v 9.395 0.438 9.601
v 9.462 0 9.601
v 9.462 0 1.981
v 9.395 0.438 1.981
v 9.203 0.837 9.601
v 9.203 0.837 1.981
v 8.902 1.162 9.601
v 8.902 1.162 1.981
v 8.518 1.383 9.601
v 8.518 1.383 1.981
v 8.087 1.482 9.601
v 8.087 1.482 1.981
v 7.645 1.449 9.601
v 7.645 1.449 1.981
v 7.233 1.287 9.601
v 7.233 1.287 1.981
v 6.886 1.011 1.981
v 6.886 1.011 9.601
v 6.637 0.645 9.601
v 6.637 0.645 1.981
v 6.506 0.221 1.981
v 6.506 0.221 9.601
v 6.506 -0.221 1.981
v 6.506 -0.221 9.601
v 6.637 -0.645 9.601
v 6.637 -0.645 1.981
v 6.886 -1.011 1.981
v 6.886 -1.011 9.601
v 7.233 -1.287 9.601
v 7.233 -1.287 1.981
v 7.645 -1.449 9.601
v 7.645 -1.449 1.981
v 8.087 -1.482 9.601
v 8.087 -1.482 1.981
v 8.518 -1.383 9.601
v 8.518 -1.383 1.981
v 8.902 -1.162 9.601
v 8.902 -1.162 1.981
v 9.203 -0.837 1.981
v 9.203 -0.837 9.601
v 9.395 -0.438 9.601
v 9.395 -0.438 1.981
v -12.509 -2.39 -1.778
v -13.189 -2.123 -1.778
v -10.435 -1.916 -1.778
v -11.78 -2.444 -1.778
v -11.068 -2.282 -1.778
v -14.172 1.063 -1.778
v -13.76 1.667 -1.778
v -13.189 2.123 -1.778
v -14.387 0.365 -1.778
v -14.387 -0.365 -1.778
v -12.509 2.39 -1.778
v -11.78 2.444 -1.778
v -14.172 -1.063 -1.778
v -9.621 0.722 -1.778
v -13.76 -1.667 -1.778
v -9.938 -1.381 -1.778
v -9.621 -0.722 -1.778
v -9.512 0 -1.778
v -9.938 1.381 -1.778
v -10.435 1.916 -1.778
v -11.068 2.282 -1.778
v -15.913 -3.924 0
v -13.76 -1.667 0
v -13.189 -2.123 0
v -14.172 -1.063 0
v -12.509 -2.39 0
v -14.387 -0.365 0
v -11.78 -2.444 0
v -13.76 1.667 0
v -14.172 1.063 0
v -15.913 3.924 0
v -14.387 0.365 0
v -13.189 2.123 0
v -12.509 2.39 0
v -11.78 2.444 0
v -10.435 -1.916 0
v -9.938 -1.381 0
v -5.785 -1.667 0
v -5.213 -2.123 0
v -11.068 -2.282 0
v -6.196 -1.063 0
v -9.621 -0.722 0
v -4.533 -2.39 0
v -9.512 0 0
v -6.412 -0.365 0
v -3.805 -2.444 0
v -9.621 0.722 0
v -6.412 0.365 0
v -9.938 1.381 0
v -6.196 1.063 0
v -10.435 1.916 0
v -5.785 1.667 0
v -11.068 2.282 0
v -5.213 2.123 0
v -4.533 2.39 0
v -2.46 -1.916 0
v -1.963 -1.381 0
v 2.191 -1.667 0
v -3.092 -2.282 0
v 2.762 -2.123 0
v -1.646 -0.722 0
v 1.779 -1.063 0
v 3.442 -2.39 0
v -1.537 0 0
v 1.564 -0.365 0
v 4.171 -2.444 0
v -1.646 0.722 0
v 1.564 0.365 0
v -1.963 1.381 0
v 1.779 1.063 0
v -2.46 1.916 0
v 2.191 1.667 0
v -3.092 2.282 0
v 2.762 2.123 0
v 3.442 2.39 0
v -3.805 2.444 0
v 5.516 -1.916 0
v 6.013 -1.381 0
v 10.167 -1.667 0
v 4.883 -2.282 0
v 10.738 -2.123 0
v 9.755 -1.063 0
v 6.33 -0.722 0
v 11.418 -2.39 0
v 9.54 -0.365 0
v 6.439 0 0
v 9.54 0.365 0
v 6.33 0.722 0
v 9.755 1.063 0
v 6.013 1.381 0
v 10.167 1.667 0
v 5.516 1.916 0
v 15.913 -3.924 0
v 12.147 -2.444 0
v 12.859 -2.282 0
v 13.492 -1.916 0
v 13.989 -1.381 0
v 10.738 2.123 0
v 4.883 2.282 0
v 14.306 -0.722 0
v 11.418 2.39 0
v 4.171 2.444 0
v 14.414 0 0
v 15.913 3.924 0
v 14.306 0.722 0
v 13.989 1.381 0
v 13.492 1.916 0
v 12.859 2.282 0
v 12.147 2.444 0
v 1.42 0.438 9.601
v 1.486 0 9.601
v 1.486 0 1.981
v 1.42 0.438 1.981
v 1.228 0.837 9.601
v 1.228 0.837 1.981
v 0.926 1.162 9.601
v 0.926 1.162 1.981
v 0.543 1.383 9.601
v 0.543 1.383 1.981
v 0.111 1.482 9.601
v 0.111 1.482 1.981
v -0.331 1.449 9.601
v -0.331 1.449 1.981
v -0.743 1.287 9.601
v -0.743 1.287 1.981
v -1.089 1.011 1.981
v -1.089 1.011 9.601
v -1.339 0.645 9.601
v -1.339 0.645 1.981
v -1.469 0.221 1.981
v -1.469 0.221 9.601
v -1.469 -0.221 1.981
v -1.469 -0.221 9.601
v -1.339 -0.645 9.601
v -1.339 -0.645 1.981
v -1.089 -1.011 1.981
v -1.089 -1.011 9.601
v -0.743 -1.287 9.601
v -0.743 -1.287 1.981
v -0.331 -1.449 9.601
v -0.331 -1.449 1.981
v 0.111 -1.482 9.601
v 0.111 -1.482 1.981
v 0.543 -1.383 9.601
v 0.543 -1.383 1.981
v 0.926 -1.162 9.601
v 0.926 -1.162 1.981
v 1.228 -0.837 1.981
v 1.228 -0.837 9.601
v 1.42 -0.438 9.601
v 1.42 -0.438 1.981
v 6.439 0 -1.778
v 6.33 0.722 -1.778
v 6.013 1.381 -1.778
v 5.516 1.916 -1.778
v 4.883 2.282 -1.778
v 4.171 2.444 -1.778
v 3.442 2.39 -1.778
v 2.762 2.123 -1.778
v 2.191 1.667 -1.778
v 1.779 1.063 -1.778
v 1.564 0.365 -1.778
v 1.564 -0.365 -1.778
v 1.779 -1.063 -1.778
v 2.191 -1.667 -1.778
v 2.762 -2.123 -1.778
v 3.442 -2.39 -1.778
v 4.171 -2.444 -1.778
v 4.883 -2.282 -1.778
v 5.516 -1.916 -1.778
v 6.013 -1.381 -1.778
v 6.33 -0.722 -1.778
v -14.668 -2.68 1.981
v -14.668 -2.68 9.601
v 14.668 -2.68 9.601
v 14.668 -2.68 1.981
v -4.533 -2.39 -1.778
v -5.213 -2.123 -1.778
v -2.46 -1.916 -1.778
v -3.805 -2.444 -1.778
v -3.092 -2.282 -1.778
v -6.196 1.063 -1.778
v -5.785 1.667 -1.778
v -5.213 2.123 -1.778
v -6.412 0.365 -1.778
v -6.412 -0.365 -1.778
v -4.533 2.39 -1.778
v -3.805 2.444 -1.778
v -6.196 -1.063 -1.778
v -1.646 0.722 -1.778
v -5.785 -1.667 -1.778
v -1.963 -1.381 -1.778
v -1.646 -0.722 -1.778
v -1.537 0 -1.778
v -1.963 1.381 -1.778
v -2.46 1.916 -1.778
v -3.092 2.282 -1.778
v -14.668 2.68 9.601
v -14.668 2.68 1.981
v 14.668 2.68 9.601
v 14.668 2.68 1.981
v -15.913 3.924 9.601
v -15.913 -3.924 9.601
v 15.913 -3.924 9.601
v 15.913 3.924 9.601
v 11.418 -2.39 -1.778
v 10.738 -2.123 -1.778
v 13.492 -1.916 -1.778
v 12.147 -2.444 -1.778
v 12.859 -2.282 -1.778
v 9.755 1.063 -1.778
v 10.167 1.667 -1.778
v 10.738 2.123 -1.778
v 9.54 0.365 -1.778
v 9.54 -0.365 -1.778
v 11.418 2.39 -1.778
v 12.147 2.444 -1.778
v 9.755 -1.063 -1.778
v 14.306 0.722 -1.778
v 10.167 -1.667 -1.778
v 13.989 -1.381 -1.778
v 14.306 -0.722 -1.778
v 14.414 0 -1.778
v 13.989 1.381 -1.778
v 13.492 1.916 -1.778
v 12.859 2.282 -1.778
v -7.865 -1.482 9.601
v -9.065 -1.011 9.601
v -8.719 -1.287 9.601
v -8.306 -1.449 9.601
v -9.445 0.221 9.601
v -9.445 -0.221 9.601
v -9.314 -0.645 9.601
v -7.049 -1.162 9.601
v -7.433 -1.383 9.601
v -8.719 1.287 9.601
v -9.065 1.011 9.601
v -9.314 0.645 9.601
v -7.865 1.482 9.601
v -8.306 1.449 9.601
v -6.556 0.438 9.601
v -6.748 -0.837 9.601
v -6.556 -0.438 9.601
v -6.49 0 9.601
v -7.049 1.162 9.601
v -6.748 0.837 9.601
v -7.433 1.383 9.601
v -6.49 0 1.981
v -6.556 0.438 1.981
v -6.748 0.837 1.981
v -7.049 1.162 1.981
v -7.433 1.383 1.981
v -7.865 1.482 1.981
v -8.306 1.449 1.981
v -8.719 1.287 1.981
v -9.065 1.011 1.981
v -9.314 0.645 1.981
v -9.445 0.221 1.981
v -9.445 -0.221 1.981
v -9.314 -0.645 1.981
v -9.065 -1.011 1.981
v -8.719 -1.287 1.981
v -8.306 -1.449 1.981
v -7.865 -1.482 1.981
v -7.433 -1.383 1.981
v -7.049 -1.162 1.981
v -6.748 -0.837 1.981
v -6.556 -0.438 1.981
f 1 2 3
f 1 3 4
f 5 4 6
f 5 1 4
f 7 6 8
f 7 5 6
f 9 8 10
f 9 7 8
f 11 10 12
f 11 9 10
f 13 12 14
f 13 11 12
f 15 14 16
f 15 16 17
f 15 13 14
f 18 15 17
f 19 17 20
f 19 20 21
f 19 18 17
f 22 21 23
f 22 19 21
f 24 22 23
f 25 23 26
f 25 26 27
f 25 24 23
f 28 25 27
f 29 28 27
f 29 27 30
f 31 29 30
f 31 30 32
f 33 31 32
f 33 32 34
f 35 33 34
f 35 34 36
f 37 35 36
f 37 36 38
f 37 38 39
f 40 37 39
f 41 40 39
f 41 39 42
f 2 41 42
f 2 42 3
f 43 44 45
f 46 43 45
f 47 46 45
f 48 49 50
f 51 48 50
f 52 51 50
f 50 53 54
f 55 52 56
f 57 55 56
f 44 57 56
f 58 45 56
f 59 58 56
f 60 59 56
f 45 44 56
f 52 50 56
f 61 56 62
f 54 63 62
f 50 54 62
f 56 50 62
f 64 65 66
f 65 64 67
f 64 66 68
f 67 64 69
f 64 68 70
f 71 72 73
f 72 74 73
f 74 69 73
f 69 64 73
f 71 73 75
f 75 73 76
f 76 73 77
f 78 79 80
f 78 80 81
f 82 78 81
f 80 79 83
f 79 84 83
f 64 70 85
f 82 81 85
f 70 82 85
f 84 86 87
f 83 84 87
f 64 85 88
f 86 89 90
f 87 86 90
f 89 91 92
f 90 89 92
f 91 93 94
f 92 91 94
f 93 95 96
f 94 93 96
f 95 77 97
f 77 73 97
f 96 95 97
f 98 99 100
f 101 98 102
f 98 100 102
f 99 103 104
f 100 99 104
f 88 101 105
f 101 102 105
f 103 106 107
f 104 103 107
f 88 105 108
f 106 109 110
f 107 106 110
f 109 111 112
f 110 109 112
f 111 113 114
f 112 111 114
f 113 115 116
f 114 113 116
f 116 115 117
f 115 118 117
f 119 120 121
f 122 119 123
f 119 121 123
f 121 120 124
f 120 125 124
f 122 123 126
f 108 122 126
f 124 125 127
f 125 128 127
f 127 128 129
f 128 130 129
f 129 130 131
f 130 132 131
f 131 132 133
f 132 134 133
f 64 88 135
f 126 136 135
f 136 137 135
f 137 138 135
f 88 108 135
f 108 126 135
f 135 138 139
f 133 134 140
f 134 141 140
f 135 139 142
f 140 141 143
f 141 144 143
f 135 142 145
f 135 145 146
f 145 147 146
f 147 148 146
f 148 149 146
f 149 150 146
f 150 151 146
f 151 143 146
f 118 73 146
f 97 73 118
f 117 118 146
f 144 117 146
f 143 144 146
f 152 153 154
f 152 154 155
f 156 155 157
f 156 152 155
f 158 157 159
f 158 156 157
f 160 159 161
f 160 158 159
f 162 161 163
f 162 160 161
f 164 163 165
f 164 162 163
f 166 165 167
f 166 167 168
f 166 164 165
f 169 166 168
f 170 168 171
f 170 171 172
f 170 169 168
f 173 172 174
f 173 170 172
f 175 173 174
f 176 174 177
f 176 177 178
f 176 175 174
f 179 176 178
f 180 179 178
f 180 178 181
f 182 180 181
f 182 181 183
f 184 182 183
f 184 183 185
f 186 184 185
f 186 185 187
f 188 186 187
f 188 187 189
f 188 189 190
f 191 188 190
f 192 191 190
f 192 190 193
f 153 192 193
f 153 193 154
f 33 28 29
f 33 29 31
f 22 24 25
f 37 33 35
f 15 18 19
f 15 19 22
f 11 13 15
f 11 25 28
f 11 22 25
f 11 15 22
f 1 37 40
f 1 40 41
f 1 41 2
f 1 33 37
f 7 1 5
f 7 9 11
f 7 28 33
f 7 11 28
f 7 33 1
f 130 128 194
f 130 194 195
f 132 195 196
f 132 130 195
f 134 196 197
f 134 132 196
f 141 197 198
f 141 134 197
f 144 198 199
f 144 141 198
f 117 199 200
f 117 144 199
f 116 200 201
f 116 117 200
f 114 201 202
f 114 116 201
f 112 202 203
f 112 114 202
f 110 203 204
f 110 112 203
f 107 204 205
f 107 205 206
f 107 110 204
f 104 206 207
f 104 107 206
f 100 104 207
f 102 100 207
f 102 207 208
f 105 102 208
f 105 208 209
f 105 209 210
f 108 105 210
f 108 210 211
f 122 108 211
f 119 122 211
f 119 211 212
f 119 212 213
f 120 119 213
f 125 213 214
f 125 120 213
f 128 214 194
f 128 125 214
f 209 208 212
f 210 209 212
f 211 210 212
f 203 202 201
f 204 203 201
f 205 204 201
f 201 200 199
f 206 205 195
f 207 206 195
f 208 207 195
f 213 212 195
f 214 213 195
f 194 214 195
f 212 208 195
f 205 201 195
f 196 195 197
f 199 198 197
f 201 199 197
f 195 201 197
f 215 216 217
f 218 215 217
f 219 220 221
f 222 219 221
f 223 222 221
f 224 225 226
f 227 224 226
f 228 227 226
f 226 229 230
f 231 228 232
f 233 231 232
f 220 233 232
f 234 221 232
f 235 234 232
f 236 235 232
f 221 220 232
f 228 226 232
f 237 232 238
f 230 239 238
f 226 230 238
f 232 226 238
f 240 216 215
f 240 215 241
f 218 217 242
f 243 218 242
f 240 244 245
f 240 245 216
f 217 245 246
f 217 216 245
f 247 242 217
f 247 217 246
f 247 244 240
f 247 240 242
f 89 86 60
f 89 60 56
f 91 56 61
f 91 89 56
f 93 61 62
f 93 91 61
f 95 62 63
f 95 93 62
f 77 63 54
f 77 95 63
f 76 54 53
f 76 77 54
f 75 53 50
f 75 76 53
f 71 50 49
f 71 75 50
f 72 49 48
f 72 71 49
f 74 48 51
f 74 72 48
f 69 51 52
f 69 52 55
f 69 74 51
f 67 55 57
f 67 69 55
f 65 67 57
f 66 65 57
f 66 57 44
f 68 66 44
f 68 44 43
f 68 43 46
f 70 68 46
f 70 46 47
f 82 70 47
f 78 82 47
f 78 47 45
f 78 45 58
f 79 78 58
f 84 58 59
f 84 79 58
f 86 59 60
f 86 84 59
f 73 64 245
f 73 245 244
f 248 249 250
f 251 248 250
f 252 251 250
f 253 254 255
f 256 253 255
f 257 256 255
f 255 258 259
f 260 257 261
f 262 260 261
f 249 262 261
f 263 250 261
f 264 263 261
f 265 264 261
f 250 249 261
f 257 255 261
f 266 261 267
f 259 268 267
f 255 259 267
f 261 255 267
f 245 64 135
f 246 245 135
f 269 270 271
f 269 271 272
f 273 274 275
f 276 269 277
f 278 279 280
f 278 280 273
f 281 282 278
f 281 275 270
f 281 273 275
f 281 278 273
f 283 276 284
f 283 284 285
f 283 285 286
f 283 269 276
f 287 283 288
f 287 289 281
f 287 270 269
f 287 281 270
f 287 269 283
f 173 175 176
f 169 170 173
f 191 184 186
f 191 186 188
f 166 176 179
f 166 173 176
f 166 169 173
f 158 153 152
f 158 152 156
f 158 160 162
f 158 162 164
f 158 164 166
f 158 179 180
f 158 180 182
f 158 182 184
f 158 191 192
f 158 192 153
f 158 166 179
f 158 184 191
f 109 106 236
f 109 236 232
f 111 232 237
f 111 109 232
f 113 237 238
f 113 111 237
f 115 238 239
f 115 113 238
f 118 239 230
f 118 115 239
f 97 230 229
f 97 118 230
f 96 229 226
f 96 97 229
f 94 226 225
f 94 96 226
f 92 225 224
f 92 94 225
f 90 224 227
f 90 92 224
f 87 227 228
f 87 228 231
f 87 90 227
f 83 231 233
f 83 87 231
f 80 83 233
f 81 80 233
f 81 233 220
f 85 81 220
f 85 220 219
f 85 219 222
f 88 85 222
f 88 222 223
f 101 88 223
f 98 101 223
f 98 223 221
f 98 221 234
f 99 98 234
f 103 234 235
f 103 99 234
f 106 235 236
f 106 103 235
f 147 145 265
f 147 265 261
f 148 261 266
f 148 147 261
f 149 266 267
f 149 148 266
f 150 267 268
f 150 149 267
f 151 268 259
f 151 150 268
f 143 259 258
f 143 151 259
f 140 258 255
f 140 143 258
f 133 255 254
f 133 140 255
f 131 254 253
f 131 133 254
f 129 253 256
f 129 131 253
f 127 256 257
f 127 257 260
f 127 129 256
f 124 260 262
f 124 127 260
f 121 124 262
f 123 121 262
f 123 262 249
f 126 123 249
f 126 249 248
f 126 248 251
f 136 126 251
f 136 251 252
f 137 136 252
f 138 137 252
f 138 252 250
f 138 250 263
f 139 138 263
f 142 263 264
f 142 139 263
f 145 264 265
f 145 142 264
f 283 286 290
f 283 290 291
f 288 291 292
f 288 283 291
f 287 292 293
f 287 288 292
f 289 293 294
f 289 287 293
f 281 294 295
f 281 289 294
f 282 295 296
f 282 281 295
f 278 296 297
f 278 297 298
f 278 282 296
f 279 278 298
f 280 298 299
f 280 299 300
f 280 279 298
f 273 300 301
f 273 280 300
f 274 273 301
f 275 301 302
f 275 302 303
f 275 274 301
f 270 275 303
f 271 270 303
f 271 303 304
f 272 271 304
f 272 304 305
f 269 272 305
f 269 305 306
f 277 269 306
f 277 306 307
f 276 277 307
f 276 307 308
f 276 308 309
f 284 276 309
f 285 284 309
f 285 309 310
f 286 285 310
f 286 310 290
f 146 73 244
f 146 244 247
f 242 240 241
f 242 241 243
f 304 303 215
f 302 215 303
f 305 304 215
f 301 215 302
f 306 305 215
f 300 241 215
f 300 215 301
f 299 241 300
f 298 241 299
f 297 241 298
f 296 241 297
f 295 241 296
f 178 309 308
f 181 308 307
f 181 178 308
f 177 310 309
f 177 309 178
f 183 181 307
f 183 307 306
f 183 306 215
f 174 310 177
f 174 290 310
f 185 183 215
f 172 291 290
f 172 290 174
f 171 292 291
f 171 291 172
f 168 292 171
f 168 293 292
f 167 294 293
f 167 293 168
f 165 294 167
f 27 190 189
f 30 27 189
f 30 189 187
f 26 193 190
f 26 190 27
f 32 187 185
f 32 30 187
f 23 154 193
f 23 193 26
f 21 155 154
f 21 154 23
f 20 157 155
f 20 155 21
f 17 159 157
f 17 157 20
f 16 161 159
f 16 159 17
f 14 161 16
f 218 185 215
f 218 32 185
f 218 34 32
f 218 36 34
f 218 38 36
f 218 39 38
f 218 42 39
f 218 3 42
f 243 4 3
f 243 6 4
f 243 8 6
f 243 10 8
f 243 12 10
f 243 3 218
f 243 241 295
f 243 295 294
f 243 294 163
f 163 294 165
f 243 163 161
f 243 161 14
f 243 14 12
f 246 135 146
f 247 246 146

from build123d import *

# Parameters (mm, degrees)
F0_W     = 31.8262
F0_H     = 7.8486
F2_DEPTH = 9.6012
F1_R     = 2.4511
F3_DEPTH = 1.778
F4_W     = 29.337
F4_H     = 5.3594
F6_DEPTH = 7.62
F5_R     = 1.4859
F7_DEPTH = 8.128


with BuildPart() as f2:
    # F0 (on Top) → F2 (new body)
    with BuildSketch(Plane.XY):
        Rectangle(F0_W, F0_H)
    extrude(amount=F2_DEPTH)

    # F1 (on face) → F3 (join)
    with BuildSketch(Plane.XY):
        with Locations((-11.9634, 0)):
            Circle(F1_R)
        with Locations((-3.9878, 0)):
            Circle(F1_R)
        with Locations((3.9878, 0)):
            Circle(F1_R)
        with Locations((11.9634, 0)):
            Circle(F1_R)
    extrude(amount=-F3_DEPTH)

    # F4 (on face) → F6 (cut)
    with BuildSketch(Plane.XY.offset(9.6012)):
        Rectangle(F4_W, F4_H)
    extrude(amount=-F6_DEPTH, mode=Mode.SUBTRACT)

    # F5 (on face) → F7 (join)
    with BuildSketch(Plane.XY.offset(9.6012)):
        with Locations((-7.9756, 0)):
            Circle(F5_R)
        Circle(F5_R)
        with Locations((7.9756, 0)):
            Circle(F5_R)
    extrude(amount=-F7_DEPTH)


solid = f2.part
